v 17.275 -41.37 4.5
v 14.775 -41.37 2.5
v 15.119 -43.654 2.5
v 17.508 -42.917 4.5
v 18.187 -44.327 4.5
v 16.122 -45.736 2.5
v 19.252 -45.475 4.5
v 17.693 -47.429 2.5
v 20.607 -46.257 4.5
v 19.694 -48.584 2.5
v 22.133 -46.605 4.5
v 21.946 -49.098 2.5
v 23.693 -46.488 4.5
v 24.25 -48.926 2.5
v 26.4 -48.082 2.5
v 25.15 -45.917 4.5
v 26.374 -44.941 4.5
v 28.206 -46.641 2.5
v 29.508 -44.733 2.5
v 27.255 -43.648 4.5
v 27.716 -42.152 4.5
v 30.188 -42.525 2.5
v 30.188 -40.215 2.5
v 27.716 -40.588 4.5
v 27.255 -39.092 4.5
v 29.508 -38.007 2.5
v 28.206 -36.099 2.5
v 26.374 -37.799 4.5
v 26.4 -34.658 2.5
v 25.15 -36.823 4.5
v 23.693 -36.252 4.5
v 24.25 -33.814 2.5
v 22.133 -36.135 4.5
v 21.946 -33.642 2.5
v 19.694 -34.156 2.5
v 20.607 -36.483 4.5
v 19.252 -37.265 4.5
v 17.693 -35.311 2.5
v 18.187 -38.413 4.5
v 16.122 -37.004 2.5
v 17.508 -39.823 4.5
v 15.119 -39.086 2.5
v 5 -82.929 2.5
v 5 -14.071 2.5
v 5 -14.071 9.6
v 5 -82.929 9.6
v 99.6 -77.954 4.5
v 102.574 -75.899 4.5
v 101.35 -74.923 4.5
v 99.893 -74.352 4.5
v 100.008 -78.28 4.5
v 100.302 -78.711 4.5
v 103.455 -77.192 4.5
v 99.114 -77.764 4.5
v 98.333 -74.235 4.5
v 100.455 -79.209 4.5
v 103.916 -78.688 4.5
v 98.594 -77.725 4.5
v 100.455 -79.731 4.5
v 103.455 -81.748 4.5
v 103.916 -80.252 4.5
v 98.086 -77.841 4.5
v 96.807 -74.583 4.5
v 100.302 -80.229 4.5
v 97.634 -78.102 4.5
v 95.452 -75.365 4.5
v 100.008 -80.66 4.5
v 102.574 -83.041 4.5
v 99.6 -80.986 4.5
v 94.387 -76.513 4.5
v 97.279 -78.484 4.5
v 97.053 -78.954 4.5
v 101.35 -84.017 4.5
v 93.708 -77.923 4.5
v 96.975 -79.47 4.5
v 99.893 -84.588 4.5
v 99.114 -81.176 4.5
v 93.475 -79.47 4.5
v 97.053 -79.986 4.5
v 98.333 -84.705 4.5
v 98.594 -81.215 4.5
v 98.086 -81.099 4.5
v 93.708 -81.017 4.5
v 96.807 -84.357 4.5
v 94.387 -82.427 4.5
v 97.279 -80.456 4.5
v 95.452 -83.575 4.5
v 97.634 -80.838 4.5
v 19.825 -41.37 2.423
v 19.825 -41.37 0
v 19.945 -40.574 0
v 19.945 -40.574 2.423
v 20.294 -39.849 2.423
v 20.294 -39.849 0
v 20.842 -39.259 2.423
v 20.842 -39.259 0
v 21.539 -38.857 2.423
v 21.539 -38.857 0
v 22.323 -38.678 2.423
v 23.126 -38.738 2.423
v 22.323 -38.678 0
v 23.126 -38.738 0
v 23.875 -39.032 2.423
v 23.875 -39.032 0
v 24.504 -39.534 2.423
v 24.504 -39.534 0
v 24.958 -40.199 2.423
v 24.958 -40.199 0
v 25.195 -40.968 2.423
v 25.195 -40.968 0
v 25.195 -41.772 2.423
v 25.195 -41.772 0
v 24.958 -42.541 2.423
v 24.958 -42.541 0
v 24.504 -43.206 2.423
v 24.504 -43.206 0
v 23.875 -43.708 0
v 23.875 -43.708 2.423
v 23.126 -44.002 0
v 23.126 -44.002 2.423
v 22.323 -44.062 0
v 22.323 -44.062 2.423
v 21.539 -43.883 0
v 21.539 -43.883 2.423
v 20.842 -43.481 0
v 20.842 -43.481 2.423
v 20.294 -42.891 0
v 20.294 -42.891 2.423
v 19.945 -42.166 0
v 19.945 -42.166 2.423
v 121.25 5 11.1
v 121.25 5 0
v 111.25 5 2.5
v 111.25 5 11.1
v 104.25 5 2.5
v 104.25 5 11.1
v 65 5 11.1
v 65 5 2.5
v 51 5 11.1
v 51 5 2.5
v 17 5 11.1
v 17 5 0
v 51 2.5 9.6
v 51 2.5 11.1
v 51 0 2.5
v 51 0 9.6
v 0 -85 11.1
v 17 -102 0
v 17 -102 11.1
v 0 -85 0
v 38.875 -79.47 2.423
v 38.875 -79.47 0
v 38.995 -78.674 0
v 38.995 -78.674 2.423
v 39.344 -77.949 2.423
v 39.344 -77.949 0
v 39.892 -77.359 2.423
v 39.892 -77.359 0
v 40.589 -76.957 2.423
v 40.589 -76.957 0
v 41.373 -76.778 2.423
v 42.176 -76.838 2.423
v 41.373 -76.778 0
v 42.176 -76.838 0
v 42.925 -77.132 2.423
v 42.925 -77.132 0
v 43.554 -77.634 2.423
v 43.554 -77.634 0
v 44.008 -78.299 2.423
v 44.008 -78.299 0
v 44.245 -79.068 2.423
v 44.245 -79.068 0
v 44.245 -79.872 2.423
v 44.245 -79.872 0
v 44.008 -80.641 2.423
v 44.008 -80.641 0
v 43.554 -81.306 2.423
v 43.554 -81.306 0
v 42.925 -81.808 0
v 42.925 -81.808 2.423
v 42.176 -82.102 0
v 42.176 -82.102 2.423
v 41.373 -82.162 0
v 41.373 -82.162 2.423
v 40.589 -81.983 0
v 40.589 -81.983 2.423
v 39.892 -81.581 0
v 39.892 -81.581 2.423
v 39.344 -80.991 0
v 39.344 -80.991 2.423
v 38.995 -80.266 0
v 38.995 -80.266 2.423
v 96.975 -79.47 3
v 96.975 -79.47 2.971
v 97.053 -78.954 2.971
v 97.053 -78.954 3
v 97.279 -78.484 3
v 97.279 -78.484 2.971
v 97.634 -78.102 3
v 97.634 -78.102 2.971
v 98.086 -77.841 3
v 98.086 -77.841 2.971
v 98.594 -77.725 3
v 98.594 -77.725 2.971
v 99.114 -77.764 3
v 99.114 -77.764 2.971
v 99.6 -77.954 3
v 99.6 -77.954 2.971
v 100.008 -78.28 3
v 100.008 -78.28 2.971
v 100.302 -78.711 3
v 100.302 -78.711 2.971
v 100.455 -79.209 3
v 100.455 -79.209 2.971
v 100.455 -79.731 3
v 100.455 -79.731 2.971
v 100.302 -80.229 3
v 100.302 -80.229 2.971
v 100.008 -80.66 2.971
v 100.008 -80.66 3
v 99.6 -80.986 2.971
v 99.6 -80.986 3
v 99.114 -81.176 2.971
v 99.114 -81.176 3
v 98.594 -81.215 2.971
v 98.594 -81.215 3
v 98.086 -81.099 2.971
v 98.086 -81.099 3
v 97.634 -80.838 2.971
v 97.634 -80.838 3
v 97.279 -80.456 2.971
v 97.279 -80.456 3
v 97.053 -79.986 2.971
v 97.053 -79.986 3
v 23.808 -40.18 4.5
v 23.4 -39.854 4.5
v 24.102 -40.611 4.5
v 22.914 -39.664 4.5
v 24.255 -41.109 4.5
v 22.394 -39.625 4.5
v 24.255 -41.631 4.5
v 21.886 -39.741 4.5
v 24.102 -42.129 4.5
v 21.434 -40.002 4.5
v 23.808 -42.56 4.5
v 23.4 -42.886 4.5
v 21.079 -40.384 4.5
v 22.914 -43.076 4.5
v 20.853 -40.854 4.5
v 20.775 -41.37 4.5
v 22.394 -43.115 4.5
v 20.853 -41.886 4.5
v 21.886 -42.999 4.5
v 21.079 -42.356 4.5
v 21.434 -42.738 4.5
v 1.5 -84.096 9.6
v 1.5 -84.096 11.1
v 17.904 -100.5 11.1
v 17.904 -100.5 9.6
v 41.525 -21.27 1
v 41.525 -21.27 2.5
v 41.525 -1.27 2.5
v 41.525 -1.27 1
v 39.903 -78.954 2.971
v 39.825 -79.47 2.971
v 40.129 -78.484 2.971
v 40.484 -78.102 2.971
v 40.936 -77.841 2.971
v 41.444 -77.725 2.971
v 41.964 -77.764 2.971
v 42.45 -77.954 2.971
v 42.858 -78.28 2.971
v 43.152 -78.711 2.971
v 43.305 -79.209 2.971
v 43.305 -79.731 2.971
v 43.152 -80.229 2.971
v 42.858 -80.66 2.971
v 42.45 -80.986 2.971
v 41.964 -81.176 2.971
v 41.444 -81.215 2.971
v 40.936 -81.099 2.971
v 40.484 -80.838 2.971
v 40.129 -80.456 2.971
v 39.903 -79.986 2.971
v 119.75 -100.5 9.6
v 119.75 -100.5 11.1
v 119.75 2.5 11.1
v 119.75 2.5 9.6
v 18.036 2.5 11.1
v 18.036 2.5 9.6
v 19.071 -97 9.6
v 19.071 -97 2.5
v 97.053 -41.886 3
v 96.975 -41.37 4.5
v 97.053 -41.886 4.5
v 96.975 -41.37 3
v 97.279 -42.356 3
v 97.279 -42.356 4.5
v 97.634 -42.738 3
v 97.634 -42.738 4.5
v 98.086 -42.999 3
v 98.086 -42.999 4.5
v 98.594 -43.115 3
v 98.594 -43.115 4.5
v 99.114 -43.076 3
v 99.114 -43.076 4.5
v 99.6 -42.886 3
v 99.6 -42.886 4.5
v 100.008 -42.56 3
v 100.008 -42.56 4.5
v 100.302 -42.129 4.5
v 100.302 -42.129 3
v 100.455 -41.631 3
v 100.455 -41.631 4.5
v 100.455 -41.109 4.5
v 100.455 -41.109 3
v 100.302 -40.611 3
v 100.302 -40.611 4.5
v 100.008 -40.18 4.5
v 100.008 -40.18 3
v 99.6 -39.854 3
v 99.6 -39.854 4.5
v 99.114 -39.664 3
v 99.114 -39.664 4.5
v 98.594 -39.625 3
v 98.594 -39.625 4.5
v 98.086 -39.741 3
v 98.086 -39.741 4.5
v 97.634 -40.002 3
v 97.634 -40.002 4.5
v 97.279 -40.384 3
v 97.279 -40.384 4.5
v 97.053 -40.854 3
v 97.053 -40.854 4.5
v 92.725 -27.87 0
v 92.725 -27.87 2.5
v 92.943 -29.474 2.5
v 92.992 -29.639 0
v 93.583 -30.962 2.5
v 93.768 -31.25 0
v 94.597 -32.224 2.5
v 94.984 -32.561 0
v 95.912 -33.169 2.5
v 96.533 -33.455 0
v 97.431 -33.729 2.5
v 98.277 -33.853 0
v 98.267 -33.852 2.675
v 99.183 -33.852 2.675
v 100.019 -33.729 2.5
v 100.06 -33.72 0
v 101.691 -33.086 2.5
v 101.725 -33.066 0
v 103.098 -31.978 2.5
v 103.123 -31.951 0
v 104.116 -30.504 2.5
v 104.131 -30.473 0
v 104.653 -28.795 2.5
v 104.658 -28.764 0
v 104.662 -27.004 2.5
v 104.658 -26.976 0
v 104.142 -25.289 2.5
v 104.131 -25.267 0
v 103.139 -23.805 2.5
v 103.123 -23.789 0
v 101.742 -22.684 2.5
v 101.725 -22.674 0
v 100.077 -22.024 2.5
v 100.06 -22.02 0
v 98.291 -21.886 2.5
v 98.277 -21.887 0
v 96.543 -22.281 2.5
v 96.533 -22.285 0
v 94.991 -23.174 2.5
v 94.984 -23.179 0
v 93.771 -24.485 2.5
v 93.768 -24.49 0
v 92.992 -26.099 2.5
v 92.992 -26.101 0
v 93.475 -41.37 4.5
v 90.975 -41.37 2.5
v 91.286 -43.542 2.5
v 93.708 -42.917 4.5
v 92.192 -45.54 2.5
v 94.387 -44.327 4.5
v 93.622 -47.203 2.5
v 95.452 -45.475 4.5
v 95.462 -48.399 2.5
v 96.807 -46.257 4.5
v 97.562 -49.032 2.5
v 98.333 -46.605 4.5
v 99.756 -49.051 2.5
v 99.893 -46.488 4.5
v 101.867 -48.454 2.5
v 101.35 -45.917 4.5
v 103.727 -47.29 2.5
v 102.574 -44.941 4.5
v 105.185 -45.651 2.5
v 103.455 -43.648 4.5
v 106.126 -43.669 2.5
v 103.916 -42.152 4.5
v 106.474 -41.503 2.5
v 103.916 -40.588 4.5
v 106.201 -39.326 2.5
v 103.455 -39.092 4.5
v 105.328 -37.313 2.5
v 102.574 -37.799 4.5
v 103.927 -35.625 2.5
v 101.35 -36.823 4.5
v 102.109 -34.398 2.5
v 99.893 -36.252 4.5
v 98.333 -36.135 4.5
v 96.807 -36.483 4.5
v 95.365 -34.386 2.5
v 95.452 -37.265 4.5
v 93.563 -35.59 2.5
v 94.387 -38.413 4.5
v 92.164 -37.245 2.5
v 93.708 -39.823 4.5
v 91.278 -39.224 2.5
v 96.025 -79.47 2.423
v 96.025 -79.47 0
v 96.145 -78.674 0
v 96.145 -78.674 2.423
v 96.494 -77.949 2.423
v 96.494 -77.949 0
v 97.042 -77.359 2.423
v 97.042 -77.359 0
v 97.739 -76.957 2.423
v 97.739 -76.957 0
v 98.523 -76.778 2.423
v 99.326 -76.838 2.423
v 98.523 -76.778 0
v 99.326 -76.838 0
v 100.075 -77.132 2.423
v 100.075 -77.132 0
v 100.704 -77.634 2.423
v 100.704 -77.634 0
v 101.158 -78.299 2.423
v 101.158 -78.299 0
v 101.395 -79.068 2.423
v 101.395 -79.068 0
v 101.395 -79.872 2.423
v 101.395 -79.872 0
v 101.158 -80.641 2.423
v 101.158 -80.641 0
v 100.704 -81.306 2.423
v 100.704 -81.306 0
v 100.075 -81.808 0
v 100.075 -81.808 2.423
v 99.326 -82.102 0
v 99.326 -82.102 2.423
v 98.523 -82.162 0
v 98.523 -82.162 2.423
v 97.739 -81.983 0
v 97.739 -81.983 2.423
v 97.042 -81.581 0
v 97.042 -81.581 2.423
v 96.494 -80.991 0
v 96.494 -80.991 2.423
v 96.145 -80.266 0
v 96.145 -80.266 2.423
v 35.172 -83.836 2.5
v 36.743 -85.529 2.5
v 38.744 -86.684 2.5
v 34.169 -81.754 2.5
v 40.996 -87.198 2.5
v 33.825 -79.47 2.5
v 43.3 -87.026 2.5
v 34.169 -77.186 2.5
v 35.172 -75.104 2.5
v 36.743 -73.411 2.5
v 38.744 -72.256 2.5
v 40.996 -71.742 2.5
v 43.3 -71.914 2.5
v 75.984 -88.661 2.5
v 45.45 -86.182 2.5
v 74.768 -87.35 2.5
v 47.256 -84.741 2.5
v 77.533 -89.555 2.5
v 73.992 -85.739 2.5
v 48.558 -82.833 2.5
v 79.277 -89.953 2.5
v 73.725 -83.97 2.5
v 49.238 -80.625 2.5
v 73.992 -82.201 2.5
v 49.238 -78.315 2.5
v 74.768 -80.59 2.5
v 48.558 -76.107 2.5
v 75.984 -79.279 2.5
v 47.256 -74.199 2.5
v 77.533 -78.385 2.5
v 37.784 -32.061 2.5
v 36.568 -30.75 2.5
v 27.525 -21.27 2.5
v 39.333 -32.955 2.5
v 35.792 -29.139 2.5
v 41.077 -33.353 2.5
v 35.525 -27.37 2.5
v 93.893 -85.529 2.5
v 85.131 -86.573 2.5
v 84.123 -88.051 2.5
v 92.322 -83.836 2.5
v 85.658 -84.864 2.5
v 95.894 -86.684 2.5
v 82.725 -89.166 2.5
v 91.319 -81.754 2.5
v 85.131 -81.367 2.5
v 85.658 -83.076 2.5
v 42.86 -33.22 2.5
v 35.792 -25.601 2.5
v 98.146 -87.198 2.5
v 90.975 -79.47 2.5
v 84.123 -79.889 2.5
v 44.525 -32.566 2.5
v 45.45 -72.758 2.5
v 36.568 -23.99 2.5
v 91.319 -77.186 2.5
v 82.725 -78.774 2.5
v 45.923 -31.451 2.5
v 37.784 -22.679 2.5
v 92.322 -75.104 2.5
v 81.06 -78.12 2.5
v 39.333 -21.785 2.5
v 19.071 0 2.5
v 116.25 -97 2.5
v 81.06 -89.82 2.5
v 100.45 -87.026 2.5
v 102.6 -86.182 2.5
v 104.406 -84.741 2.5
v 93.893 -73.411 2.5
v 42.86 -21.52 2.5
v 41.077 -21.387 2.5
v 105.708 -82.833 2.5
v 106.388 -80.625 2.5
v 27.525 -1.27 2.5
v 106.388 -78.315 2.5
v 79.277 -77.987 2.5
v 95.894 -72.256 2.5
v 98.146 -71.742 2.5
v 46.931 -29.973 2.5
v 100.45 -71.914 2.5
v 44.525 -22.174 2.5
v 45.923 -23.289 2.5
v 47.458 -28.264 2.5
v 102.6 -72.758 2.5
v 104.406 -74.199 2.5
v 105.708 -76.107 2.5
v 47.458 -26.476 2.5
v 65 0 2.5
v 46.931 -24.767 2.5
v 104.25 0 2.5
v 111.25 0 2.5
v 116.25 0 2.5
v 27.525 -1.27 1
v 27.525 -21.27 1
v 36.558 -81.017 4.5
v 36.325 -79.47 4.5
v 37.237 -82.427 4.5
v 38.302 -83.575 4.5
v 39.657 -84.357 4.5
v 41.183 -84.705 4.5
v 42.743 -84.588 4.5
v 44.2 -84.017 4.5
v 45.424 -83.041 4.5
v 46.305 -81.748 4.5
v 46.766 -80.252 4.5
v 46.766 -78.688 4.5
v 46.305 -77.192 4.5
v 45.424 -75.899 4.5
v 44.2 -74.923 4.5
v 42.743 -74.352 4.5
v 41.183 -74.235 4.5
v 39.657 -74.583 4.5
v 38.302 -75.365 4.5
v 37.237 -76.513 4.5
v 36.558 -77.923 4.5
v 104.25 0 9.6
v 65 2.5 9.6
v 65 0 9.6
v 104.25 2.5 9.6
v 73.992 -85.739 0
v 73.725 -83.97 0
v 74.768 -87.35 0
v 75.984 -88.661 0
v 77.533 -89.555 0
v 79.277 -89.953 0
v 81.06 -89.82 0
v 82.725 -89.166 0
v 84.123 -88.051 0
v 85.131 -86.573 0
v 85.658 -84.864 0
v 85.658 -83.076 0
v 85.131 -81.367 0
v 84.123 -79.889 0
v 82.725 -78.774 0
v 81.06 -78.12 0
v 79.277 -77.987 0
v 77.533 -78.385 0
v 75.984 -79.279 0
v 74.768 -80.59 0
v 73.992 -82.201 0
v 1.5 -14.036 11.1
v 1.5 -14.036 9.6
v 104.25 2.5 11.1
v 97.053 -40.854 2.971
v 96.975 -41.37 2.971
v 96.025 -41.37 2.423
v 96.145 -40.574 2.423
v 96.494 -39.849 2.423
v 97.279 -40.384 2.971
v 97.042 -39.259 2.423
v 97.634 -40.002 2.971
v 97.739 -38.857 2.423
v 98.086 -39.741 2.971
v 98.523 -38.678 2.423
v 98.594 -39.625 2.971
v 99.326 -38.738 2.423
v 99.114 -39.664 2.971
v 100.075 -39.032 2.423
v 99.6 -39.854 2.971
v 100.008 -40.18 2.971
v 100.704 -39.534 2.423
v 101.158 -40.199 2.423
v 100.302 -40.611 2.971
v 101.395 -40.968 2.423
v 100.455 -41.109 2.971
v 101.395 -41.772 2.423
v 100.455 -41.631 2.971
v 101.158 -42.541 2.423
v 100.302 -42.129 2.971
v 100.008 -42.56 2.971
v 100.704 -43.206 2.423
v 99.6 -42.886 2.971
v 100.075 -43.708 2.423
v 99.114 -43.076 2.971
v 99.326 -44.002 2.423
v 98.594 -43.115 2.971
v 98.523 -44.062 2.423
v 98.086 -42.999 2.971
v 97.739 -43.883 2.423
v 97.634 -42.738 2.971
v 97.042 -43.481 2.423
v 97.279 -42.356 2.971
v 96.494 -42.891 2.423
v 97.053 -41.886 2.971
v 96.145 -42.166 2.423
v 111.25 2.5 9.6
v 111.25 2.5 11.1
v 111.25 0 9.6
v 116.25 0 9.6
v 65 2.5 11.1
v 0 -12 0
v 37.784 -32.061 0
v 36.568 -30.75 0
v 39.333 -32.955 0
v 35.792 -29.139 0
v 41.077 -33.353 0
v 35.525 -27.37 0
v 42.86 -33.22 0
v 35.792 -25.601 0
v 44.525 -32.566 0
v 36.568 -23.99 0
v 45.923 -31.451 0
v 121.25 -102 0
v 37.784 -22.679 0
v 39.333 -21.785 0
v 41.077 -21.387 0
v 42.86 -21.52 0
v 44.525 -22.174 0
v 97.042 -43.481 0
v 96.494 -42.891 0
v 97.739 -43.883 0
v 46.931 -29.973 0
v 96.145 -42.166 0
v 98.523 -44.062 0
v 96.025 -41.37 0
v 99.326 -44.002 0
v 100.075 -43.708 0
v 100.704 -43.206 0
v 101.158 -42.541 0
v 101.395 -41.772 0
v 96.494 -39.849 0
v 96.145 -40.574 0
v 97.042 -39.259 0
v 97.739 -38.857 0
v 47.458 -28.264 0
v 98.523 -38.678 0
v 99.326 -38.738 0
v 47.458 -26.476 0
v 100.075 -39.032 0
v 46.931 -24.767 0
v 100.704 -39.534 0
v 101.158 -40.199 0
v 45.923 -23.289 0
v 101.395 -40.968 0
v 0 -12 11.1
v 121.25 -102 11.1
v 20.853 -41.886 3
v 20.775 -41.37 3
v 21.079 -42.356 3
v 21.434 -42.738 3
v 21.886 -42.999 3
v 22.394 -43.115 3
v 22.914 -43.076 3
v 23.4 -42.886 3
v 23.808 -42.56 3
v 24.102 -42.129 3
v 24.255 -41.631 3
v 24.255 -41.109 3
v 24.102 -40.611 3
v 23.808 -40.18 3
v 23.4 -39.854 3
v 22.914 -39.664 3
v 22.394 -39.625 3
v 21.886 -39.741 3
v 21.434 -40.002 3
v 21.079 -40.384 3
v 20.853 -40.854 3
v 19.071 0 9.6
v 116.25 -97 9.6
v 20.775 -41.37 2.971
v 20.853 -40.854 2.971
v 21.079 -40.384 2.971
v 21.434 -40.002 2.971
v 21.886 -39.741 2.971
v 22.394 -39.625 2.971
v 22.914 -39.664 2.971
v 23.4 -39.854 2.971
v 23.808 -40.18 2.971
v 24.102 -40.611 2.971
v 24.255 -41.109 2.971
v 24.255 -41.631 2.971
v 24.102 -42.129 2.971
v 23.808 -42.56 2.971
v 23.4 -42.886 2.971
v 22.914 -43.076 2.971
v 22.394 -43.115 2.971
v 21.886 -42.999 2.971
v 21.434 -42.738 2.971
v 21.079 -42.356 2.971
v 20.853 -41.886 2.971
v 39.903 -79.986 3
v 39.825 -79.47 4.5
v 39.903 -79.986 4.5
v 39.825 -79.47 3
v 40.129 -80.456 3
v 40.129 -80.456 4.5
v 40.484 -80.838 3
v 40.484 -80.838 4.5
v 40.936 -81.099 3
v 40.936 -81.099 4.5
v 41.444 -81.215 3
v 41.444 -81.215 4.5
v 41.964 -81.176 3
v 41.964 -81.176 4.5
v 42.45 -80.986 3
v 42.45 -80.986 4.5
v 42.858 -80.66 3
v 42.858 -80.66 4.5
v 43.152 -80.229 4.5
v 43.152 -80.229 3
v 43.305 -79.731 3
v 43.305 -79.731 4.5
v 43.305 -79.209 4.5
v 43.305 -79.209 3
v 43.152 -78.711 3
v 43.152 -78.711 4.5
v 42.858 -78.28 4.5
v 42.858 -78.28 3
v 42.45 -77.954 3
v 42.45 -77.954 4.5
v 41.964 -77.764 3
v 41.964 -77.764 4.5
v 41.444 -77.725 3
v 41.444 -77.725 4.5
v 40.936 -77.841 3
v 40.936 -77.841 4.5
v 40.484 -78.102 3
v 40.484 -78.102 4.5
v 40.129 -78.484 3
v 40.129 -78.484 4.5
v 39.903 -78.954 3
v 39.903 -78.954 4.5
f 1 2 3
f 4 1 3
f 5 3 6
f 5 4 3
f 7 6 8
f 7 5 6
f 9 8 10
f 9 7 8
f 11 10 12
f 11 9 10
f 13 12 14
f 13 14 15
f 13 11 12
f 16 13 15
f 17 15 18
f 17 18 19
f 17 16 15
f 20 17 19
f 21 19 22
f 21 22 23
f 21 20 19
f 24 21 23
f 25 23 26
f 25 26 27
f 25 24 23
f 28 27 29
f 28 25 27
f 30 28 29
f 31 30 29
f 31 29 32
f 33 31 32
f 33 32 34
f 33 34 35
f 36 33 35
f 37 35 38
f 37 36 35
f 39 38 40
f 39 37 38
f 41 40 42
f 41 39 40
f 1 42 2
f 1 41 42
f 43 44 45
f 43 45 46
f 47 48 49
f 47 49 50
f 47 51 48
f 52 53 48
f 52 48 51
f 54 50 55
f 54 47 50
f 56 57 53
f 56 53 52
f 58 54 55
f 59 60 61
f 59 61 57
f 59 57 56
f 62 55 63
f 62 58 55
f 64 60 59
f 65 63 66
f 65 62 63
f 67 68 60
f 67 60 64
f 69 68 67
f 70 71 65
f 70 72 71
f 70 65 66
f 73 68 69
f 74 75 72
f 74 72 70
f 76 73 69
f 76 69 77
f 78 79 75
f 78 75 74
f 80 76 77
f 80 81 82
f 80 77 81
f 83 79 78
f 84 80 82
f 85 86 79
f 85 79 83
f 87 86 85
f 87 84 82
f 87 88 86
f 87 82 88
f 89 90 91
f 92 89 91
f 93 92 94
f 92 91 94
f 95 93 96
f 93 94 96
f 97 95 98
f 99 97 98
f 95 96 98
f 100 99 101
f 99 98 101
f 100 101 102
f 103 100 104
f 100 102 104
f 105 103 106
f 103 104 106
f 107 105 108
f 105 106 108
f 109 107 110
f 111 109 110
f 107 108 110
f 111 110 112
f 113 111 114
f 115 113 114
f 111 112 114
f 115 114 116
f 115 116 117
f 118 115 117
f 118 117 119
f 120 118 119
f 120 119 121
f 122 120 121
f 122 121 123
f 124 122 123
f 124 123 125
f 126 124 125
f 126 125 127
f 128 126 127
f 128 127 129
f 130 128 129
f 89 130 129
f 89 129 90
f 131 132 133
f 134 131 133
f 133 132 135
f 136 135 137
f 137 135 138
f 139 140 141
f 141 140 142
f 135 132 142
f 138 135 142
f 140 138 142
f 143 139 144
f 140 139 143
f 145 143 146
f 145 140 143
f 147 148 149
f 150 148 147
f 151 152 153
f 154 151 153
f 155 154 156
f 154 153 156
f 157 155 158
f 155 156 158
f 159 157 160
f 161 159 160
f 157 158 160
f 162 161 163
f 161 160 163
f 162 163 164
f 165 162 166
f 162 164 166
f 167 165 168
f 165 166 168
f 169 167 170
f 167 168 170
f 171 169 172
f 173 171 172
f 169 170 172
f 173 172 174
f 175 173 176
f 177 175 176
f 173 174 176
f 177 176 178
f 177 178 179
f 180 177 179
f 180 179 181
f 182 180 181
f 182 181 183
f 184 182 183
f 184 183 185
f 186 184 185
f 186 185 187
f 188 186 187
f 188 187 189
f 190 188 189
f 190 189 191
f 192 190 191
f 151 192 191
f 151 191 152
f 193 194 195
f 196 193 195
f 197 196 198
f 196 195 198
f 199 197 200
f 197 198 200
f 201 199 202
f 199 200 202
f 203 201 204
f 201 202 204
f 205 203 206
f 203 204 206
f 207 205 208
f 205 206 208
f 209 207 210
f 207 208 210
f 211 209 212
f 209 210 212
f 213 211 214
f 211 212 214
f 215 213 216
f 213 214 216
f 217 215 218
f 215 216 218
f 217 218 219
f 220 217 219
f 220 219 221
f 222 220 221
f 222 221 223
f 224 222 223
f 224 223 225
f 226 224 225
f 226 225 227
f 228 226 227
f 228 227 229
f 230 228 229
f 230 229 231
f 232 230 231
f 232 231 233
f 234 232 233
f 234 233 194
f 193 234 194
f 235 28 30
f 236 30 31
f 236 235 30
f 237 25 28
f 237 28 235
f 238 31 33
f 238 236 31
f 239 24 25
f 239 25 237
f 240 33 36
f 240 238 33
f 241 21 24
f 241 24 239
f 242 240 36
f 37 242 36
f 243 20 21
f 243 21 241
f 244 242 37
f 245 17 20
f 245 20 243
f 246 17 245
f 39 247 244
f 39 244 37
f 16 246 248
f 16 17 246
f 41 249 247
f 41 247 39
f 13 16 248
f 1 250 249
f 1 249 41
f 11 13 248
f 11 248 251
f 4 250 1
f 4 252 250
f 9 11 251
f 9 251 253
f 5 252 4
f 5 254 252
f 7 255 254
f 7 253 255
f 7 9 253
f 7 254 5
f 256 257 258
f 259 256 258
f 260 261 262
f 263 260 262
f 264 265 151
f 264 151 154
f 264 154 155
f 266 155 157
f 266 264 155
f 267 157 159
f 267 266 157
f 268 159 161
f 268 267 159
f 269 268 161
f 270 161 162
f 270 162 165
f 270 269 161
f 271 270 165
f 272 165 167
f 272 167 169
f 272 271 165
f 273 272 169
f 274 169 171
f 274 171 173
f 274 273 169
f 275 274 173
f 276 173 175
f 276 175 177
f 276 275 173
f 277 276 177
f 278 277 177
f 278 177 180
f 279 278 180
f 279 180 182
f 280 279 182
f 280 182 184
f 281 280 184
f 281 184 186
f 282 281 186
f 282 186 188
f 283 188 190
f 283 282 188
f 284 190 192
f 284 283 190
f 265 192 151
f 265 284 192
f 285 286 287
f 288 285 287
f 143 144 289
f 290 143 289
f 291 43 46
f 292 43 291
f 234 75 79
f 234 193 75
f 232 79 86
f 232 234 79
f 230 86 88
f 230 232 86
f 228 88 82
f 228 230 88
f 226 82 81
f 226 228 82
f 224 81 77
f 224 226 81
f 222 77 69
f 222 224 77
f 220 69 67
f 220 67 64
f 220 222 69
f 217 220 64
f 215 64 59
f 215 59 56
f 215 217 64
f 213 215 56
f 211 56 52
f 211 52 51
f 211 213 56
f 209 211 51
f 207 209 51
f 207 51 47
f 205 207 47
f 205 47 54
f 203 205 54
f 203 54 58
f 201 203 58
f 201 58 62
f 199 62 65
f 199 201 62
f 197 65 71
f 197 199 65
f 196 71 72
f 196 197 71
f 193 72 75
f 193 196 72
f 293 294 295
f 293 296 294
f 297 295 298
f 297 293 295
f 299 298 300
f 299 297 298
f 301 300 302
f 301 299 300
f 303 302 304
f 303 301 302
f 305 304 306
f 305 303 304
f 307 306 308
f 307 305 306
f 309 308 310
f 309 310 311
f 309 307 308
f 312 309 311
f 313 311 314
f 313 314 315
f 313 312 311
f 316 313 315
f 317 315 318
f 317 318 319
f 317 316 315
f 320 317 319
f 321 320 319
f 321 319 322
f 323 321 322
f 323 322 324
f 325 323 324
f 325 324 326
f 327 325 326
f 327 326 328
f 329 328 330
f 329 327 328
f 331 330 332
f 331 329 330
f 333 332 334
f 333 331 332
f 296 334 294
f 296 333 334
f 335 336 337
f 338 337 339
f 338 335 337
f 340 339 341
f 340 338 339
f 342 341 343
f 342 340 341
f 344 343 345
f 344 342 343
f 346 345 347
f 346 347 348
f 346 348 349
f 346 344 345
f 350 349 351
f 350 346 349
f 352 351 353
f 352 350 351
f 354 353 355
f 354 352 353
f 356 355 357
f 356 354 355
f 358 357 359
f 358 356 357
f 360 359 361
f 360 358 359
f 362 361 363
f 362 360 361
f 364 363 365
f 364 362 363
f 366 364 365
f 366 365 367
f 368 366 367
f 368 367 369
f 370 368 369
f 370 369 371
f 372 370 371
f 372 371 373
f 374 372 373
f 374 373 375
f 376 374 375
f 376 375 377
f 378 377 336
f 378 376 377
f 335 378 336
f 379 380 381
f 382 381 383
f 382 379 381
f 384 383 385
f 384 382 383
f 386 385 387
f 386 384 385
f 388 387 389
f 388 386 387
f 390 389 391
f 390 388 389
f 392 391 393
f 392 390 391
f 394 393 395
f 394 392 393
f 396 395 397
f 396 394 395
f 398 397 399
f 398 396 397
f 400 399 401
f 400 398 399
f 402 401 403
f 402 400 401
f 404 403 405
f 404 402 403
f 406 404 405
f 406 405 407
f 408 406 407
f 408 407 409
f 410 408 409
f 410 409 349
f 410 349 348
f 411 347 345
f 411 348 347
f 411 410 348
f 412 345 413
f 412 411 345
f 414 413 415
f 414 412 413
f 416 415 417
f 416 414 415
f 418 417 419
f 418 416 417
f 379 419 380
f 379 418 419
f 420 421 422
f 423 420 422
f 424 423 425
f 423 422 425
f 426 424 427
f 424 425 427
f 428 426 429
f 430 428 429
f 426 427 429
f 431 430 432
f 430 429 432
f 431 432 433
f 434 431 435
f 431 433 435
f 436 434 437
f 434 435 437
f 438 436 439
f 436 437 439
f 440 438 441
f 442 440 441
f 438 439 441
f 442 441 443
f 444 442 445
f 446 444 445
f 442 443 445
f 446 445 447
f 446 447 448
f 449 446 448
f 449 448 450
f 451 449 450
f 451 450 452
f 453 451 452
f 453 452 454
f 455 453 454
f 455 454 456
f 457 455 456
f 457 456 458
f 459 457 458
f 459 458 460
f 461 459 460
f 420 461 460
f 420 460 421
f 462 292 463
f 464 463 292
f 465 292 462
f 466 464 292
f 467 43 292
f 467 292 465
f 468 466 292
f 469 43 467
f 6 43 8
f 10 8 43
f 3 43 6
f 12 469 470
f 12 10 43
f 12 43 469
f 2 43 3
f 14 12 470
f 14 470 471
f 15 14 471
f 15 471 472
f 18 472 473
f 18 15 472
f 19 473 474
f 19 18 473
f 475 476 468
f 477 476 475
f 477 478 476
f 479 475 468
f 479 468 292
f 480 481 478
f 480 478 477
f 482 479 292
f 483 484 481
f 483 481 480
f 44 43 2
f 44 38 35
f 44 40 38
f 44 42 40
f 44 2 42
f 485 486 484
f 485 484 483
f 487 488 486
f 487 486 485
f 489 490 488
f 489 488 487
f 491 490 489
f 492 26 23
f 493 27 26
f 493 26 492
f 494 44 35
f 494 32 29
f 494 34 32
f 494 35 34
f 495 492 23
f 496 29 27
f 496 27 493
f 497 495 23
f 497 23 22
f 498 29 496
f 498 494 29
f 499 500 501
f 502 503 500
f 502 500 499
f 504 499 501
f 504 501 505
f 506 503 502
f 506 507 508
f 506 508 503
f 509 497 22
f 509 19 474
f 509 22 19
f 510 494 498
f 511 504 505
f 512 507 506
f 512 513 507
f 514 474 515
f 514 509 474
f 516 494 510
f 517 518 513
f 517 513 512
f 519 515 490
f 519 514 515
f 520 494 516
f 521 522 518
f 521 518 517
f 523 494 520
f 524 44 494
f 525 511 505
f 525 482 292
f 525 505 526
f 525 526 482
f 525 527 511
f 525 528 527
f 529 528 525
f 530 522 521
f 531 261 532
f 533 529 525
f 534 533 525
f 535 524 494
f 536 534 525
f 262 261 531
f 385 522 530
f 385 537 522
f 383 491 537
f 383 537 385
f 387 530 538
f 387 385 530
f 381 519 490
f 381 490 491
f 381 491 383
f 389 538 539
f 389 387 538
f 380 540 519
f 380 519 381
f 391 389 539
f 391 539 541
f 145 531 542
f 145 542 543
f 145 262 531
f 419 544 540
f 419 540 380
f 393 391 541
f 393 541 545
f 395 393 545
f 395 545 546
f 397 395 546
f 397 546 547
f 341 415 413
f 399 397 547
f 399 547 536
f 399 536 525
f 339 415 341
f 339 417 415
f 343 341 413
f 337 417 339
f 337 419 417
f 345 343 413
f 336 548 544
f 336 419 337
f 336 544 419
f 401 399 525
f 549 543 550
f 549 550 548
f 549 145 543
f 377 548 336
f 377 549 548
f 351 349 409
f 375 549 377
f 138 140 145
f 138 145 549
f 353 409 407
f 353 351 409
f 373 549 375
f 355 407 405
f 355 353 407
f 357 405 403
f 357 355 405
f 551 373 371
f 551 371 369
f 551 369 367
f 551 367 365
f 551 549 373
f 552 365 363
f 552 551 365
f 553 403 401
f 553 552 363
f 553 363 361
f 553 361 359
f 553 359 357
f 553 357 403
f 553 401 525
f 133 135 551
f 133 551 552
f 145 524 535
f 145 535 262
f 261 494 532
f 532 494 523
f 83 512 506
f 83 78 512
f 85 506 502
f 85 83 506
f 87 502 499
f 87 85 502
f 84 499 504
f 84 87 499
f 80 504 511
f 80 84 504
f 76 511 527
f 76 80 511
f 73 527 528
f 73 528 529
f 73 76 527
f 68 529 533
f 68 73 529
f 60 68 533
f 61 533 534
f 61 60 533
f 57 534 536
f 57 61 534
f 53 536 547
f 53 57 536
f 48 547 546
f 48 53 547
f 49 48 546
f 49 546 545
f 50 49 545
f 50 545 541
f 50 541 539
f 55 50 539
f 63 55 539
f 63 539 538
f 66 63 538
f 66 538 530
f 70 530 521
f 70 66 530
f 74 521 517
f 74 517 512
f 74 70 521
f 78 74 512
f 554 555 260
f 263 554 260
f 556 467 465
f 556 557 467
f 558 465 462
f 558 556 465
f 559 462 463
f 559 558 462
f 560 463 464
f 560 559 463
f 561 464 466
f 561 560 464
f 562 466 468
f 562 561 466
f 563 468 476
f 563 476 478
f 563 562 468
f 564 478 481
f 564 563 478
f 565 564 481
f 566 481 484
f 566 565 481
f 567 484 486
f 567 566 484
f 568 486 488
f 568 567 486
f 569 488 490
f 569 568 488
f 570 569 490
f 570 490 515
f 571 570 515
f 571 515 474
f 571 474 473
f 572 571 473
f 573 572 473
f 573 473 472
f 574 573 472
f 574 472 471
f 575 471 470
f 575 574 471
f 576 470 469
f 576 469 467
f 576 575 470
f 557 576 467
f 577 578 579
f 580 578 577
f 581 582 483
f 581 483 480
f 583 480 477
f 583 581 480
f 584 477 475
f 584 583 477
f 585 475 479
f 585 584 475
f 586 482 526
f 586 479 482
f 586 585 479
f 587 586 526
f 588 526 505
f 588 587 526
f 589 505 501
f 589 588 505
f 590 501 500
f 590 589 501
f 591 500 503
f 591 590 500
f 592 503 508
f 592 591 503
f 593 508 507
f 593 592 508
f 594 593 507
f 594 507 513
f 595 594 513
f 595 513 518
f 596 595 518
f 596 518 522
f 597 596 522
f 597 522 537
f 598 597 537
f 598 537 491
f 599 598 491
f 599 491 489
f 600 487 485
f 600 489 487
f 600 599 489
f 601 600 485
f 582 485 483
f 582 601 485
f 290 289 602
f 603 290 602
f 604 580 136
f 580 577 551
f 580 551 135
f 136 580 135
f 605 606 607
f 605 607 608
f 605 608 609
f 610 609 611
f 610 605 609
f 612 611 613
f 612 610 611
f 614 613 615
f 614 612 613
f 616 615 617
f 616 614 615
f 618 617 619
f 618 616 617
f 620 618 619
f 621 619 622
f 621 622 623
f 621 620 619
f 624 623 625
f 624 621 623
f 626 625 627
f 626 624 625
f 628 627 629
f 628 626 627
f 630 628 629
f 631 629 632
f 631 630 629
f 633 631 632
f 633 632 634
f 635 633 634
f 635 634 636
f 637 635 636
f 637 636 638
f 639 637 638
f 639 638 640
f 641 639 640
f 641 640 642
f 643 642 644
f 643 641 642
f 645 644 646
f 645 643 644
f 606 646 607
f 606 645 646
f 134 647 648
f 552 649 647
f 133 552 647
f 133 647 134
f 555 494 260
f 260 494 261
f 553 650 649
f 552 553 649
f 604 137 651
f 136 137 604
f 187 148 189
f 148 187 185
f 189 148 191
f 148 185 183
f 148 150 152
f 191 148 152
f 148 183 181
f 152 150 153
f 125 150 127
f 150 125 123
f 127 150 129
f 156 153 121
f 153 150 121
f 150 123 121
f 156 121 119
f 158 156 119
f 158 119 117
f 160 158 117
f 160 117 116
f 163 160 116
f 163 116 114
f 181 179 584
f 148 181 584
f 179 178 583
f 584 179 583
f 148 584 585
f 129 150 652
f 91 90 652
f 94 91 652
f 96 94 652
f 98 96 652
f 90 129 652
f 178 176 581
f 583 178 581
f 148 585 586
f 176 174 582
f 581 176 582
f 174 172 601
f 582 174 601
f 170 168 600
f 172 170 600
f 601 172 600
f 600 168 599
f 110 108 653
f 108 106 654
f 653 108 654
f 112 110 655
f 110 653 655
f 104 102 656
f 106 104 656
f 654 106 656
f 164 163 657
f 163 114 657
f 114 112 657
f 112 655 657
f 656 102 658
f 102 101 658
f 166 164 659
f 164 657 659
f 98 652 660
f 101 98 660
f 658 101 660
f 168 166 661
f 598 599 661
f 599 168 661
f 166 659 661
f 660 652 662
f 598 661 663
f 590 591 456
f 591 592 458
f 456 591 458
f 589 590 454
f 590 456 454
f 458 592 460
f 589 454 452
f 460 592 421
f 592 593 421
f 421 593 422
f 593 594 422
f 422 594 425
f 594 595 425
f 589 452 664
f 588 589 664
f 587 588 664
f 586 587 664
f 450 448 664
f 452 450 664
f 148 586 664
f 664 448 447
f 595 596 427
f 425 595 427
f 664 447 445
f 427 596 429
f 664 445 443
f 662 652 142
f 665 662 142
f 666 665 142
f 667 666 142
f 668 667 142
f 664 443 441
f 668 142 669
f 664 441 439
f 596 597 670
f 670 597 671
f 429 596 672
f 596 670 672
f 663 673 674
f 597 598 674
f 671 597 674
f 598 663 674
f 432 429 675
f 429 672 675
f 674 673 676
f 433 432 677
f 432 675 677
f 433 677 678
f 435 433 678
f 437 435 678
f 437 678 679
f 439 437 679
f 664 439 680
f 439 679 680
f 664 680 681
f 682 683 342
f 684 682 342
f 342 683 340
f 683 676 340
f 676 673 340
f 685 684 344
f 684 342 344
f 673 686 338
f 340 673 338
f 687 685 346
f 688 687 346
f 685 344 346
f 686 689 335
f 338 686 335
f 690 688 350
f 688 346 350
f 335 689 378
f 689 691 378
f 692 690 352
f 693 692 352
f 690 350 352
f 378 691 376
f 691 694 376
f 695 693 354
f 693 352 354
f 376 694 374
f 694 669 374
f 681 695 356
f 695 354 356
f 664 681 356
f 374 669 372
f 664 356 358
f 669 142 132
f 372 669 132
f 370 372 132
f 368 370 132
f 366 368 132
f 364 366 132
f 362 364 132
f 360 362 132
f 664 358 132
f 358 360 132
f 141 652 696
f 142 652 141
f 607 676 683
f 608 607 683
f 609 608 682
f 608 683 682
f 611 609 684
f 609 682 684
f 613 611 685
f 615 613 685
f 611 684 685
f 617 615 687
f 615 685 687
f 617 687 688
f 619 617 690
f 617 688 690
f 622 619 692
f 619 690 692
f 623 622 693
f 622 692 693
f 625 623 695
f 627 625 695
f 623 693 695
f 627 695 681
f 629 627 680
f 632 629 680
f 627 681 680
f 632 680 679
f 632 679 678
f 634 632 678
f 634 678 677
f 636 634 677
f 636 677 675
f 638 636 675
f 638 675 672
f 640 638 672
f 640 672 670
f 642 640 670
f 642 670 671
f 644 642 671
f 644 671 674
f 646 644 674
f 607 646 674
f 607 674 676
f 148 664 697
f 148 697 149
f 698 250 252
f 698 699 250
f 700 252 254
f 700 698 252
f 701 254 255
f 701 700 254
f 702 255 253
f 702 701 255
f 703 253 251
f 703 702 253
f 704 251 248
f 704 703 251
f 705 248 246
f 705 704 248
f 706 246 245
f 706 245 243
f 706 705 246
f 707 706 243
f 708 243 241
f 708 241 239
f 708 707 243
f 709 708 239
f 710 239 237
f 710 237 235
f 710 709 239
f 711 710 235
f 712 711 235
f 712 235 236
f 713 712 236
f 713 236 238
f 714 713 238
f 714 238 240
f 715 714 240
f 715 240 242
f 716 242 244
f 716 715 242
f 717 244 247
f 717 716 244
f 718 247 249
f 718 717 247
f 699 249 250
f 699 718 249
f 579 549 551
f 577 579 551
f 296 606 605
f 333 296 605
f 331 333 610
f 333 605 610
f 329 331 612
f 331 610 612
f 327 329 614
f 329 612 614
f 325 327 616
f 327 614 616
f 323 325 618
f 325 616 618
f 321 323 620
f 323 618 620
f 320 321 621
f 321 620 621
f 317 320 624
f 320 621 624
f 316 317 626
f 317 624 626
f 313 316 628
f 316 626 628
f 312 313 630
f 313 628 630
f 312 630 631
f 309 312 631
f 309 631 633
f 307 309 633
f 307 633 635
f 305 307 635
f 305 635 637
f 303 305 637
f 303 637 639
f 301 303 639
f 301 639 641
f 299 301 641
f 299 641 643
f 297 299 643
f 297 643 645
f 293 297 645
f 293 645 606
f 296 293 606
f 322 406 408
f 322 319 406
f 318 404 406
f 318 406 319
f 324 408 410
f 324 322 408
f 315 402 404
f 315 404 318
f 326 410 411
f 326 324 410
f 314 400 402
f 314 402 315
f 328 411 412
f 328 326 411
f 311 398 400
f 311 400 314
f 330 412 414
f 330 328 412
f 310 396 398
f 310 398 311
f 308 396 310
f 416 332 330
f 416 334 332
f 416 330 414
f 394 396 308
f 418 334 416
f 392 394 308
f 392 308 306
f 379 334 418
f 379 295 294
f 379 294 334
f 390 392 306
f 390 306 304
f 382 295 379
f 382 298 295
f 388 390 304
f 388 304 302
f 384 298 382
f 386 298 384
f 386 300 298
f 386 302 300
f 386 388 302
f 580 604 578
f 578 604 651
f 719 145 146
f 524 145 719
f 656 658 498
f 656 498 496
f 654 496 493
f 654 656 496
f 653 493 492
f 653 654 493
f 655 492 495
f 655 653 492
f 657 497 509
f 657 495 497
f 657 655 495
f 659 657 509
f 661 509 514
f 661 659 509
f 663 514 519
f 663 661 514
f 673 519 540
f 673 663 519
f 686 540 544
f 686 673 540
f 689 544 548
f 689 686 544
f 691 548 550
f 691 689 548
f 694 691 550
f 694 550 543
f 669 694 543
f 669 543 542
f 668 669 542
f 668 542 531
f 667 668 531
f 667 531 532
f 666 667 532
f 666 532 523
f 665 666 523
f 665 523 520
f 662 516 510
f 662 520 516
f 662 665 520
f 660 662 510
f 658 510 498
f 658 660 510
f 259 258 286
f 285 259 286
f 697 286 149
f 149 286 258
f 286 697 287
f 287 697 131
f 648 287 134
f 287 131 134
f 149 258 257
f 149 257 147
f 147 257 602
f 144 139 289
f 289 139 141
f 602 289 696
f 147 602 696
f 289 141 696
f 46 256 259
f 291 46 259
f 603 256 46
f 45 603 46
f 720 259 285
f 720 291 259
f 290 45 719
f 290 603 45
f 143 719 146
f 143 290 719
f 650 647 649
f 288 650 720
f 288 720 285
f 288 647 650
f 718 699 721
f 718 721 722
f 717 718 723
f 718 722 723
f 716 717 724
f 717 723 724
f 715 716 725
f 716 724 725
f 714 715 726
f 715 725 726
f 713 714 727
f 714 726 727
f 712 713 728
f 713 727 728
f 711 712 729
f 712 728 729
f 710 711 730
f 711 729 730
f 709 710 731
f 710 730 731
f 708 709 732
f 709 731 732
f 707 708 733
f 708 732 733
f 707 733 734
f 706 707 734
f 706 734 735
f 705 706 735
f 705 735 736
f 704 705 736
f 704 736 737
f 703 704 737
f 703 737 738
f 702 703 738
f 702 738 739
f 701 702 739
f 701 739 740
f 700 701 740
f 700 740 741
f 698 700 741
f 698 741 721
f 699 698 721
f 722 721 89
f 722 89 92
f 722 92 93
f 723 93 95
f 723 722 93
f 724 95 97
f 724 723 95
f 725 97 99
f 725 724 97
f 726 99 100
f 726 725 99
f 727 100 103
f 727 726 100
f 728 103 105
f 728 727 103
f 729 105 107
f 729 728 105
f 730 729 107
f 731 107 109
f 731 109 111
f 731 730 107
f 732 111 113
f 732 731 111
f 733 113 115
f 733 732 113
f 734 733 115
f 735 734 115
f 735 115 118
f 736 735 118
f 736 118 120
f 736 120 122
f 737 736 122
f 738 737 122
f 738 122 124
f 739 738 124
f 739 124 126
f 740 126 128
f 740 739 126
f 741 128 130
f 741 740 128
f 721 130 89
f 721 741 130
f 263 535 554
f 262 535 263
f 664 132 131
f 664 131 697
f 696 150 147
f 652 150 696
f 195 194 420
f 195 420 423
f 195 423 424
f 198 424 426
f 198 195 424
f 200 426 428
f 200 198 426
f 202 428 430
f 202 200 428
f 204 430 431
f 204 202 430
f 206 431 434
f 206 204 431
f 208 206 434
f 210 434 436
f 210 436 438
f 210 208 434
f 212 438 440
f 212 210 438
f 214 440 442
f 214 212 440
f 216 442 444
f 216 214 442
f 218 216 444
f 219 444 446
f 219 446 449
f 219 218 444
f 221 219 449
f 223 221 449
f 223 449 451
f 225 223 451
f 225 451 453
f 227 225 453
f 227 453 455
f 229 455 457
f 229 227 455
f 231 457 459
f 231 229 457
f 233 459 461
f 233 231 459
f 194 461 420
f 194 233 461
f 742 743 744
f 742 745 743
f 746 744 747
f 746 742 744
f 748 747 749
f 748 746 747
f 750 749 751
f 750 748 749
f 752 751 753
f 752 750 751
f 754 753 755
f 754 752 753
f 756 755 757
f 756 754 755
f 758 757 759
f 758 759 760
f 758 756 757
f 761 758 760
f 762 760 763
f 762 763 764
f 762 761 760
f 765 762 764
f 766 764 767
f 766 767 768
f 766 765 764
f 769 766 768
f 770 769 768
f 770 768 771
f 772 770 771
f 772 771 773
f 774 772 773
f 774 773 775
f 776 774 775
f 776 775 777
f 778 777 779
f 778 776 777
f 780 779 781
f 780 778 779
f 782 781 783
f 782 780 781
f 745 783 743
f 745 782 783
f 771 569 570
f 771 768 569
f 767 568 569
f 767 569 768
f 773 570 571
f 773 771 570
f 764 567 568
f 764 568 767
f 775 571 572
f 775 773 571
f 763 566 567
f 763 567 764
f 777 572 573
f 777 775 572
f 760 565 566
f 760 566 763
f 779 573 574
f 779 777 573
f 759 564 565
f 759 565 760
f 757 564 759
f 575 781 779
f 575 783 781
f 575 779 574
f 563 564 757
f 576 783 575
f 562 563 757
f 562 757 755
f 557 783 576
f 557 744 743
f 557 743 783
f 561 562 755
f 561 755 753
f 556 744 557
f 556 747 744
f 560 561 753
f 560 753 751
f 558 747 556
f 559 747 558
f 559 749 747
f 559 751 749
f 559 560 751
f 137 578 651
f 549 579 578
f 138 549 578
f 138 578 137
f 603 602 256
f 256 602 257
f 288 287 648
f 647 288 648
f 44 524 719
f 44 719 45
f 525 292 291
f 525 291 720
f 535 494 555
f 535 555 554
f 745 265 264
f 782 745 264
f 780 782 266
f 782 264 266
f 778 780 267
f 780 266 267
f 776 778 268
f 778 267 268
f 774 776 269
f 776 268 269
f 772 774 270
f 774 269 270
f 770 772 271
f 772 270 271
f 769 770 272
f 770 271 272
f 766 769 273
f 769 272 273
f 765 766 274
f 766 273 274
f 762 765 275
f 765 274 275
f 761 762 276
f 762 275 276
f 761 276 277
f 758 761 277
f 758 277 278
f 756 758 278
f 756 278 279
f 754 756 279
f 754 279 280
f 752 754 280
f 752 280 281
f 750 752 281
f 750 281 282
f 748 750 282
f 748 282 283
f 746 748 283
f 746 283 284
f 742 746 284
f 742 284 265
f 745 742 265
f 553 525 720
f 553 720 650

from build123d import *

# Parameters (mm, degrees)
BOSS_EXTRU_1_DEPTH           = 2.5
ESQUISSE2_W                  = 39.25
ESQUISSE2_H                  = 5
BOSS_EXTRU_2_DEPTH           = 8.6
ESQUISSE16_W                 = 1.8
ESQUISSE16_H                 = 2.5
D_GAGEMENT_M32_AT_2_COUNT    = 2
D_GAGEMENT_M32_AT_2_PITCH    = 42.597094971
D_GAGEMENT_M32_AT_3_COUNT    = 2
D_GAGEMENT_M32_AT_3_PITCH    = 76.2
D_GAGEMENT_M32_AT_4_COUNT    = 2
D_GAGEMENT_M32_AT_4_PITCH    = 85.194189943
ESQUISSE18_R                 = 2.7
ENL_V_MAT_EXTRU_2_DEPTH      = 3
ENL_V_MAT_EXTRU_3_DEPTH      = 1.5
ENL_V_MAT_EXTRU_4_DEPTH      = 159.680567493
ENL_V_MAT_EXTRU_4_DEPTH_BACK = 10
ESQUISSE21_R                 = 6
CHANFREIN2_SIZE              = 0.577350269
CHANFREIN2_SIZE_2            = 1
ESQUISSE22_W                 = 14
ESQUISSE22_H                 = 20
ENL_V_MAT_EXTRU_13_DEPTH     = 1.5


with BuildPart() as part:
    # Esquisse1 → Boss.-Extru.1 (new body)
    with BuildSketch(Plane.XY):
        Polygon((0, -85), (17, -102), (121.25, -102), (121.25, 5), (17, 5), (0, -12), align=None)
    extrude(amount=BOSS_EXTRU_1_DEPTH)

    # Esquisse2 → Boss.-Extru.2 (add)
    with BuildSketch(Plane.XY.offset(2.5)):
        Polygon((5, -82.928932188), (19.071067812, -97), (116.25, -97), (116.25, 0), (111.25, 0), (111.25, 5), (121.25, 5), (121.25, -102), (17, -102), (0, -85), (0, -12), (17, 5), (51, 5), (51, 0), (19.071067812, 0), (5, -14.071067812), align=None)
        with Locations((84.625, 2.5)):
            Rectangle(ESQUISSE2_W, ESQUISSE2_H)
    extrude(amount=BOSS_EXTRU_2_DEPTH)

    # Esquisse8 → Révolution3 (revolve)
    with BuildSketch(Plane(origin=(98.725, -41.37, 2.5), x_dir=(0, 0, -1), z_dir=(1, 0, 0)), mode=Mode.PRIVATE) as r_volution3_sk:
        Polygon((0, 1.75), (0, 7.75), (-2, 5.25), (-2, 1.75), align=None)
    revolve(r_volution3_sk.sketch.rotate(Axis((98.725, -41.37, 2.5), (0, 0, 1)), 90), axis=Axis((98.725, -41.37, 2.5), (0, 0, 1)))

    # Esquisse9 → Révolution4 (revolve)
    with BuildSketch(Plane(origin=(41.575, -79.47, 2.5), x_dir=(0, 0, -1), z_dir=(1, 0, 0)), mode=Mode.PRIVATE) as r_volution4_sk:
        Polygon((0, 1.75), (0, 7.75), (-2, 5.25), (-2, 1.75), align=None)
    revolve(r_volution4_sk.sketch.rotate(Axis((41.575, -79.47, 2.5), (0, 0, 1)), 90), axis=Axis((41.575, -79.47, 2.5), (0, 0, 1)))

    # Esquisse10 → Révolution5 (revolve)
    with BuildSketch(Plane(origin=(98.725, -79.47, 2.5), x_dir=(0, 0, -1), z_dir=(1, 0, 0)), mode=Mode.PRIVATE) as r_volution5_sk:
        Polygon((0, 1.75), (0, 7.75), (-2, 5.25), (-2, 1.75), align=None)
    revolve(r_volution5_sk.sketch.rotate(Axis((98.725, -79.47, 2.5), (0, 0, 1)), 90), axis=Axis((98.725, -79.47, 2.5), (0, 0, 1)))

    # Esquisse16 → Dégagement M32 (revolve, cut)
    with BuildSketch(Plane(origin=(22.525, -41.37, 2.5), x_dir=(0, -1, 0), z_dir=(1, 0, 0))):
        with Locations((0.9, 1.25)):
            Rectangle(ESQUISSE16_W, ESQUISSE16_H)
    d_gagement_m32 = revolve(axis=Axis((22.525, -41.37, 8.85), (0, 0, -1)), mode=Mode.SUBTRACT)

    # Dégagement M32 at 2: Dégagement M32 ×2
    with Locations(*[Vector(0.4472135954999577, -0.8944271909999161, 0) * (i * D_GAGEMENT_M32_AT_2_PITCH) for i in range(1, D_GAGEMENT_M32_AT_2_COUNT)]):
        add(d_gagement_m32, mode=Mode.SUBTRACT)

    # Dégagement M32 at 3: Dégagement M32 ×2
    with Locations(*[(i * D_GAGEMENT_M32_AT_3_PITCH, 0, 0) for i in range(1, D_GAGEMENT_M32_AT_3_COUNT)]):
        add(d_gagement_m32, mode=Mode.SUBTRACT)

    # Dégagement M32 at 4: Dégagement M32 ×2
    with Locations(*[Vector(0.8944271909999159, -0.44721359549995804, 0) * (i * D_GAGEMENT_M32_AT_4_PITCH) for i in range(1, D_GAGEMENT_M32_AT_4_COUNT)]):
        add(d_gagement_m32, mode=Mode.SUBTRACT)

    # Esquisse17 → Révolution6 (revolve)
    with BuildSketch(Plane(origin=(22.525, -41.37, 2.5), x_dir=(0, 0, -1), z_dir=(1, 0, 0)), mode=Mode.PRIVATE) as r_volution6_sk:
        Polygon((0, 1.75), (0, 7.75), (-2, 5.25), (-2, 1.75), align=None)
    revolve(r_volution6_sk.sketch.rotate(Axis((22.525, -41.37, 2.5), (0, 0, 1)), 90), axis=Axis((22.525, -41.37, 2.5), (0, 0, 1)))

    # Esquisse18 → Enlèv. mat.-Extru.2 (cut)
    with BuildSketch(Plane(origin=(0, 0, 0), x_dir=(-1, 0, 0), z_dir=(0, 0, -1))):
        with Locations((-22.525, -41.37)):
            Circle(ESQUISSE18_R)
        with Locations((-98.725, -41.37)):
            Circle(ESQUISSE18_R)
        with Locations((-41.575, -79.47)):
            Circle(ESQUISSE18_R)
        with Locations((-98.725, -79.47)):
            Circle(ESQUISSE18_R)
    extrude(amount=-ENL_V_MAT_EXTRU_2_DEPTH, mode=Mode.SUBTRACT)

    # Esquisse20 → Enlèv. mat.-Extru.3 (cut)
    with BuildSketch(Plane.XY.offset(11.1)):
        Polygon((119.75, 2.5), (18.035533906, 2.5), (1.5, -14.035533906), (1.5, -84.095836944), (17.904163056, -100.5), (119.75, -100.5), align=None)
    extrude(amount=-ENL_V_MAT_EXTRU_3_DEPTH, mode=Mode.SUBTRACT)

    # Esquisse21 → Enlèv. mat.-Extru.4 (cut, two sides: drawn at the far end of the back side and taken through both)
    with BuildSketch(Plane.XY.offset(2.5).offset(-ENL_V_MAT_EXTRU_4_DEPTH_BACK)):
        with Locations(Location((98.725, -27.87, 0), (0, 0, 180))):
            Circle(ESQUISSE21_R)
        with Locations(Location((41.525, -27.37, 0), (0, 0, 180))):
            Circle(ESQUISSE21_R)
        with Locations(Location((79.725, -83.97, 0), (0, 0, 180))):
            Circle(ESQUISSE21_R)
    extrude(amount=ENL_V_MAT_EXTRU_4_DEPTH + ENL_V_MAT_EXTRU_4_DEPTH_BACK, mode=Mode.SUBTRACT)

    # Chanfrein2
    # the kernel refuses this chamfer: 1, 0.577350269 mm, written as the material it adds along each edge
    with BuildSketch(Plane(origin=(98.725, -79.47, 3), x_dir=(-1, 0, 0), z_dir=(0, -1, 0))) as chanfrein2_piece_1_section:
        Polygon((2.7, CHANFREIN2_SIZE), (2.7 - CHANFREIN2_SIZE_2, 0), (2.7, 0), align=None)
    chanfrein2_piece_1 = revolve(axis=Axis((98.725, -79.47, 3), (0, 0, -1)), mode=Mode.PRIVATE)
    chanfrein2_piece_1 = chanfrein2_piece_1 - Plane(origin=(98.725, -79.47, 2.701530762), x_dir=(-1, 0, 0), z_dir=(0, 0, -1)) * Cylinder(1.75, 11, mode=Mode.PRIVATE)
    add(chanfrein2_piece_1)
    with BuildSketch(Plane(origin=(41.575, -79.47, 3), x_dir=(-1, 0, 0), z_dir=(0, -1, 0))) as chanfrein2_piece_2_section:
        Polygon((2.7, CHANFREIN2_SIZE), (2.7 - CHANFREIN2_SIZE_2, 0), (2.7, 0), align=None)
    chanfrein2_piece_2 = revolve(axis=Axis((41.575, -79.47, 3), (0, 0, -1)), mode=Mode.PRIVATE)
    chanfrein2_piece_2 = chanfrein2_piece_2 - Plane(origin=(41.575, -79.47, 2.701530762), x_dir=(-1, 0, 0), z_dir=(0, 0, -1)) * Cylinder(1.75, 11, mode=Mode.PRIVATE)
    add(chanfrein2_piece_2)
    with BuildSketch(Plane(origin=(22.525, -41.37, 3), x_dir=(-1, 0, 0), z_dir=(0, -1, 0))) as chanfrein2_piece_3_section:
        Polygon((2.7, CHANFREIN2_SIZE), (2.7 - CHANFREIN2_SIZE_2, 0), (2.7, 0), align=None)
    chanfrein2_piece_3 = revolve(axis=Axis((22.525, -41.37, 3), (0, 0, -1)), mode=Mode.PRIVATE)
    chanfrein2_piece_3 = chanfrein2_piece_3 - Plane(origin=(22.525, -41.37, 2.701530762), x_dir=(-1, 0, 0), z_dir=(0, 0, -1)) * Cylinder(1.75, 11, mode=Mode.PRIVATE)
    add(chanfrein2_piece_3)
    with BuildSketch(Plane(origin=(98.725, -41.37, 3), x_dir=(-1, 0, 0), z_dir=(0, -1, 0))) as chanfrein2_piece_4_section:
        Polygon((2.7, CHANFREIN2_SIZE), (2.7 - CHANFREIN2_SIZE_2, 0), (2.7, 0), align=None)
    chanfrein2_piece_4 = revolve(axis=Axis((98.725, -41.37, 3), (0, 0, -1)), mode=Mode.PRIVATE)
    chanfrein2_piece_4 = chanfrein2_piece_4 - Plane(origin=(98.725, -41.37, 2.701530762), x_dir=(-1, 0, 0), z_dir=(0, 0, -1)) * Cylinder(1.75, 11, mode=Mode.PRIVATE)
    add(chanfrein2_piece_4)

    # Esquisse22 → Enlèv. mat.-Extru.13 (cut)
    with BuildSketch(Plane.XY.offset(2.5)):
        with Locations((34.525, -11.27)):
            Rectangle(ESQUISSE22_W, ESQUISSE22_H)
    extrude(amount=-ENL_V_MAT_EXTRU_13_DEPTH, mode=Mode.SUBTRACT)


solid = part.part
